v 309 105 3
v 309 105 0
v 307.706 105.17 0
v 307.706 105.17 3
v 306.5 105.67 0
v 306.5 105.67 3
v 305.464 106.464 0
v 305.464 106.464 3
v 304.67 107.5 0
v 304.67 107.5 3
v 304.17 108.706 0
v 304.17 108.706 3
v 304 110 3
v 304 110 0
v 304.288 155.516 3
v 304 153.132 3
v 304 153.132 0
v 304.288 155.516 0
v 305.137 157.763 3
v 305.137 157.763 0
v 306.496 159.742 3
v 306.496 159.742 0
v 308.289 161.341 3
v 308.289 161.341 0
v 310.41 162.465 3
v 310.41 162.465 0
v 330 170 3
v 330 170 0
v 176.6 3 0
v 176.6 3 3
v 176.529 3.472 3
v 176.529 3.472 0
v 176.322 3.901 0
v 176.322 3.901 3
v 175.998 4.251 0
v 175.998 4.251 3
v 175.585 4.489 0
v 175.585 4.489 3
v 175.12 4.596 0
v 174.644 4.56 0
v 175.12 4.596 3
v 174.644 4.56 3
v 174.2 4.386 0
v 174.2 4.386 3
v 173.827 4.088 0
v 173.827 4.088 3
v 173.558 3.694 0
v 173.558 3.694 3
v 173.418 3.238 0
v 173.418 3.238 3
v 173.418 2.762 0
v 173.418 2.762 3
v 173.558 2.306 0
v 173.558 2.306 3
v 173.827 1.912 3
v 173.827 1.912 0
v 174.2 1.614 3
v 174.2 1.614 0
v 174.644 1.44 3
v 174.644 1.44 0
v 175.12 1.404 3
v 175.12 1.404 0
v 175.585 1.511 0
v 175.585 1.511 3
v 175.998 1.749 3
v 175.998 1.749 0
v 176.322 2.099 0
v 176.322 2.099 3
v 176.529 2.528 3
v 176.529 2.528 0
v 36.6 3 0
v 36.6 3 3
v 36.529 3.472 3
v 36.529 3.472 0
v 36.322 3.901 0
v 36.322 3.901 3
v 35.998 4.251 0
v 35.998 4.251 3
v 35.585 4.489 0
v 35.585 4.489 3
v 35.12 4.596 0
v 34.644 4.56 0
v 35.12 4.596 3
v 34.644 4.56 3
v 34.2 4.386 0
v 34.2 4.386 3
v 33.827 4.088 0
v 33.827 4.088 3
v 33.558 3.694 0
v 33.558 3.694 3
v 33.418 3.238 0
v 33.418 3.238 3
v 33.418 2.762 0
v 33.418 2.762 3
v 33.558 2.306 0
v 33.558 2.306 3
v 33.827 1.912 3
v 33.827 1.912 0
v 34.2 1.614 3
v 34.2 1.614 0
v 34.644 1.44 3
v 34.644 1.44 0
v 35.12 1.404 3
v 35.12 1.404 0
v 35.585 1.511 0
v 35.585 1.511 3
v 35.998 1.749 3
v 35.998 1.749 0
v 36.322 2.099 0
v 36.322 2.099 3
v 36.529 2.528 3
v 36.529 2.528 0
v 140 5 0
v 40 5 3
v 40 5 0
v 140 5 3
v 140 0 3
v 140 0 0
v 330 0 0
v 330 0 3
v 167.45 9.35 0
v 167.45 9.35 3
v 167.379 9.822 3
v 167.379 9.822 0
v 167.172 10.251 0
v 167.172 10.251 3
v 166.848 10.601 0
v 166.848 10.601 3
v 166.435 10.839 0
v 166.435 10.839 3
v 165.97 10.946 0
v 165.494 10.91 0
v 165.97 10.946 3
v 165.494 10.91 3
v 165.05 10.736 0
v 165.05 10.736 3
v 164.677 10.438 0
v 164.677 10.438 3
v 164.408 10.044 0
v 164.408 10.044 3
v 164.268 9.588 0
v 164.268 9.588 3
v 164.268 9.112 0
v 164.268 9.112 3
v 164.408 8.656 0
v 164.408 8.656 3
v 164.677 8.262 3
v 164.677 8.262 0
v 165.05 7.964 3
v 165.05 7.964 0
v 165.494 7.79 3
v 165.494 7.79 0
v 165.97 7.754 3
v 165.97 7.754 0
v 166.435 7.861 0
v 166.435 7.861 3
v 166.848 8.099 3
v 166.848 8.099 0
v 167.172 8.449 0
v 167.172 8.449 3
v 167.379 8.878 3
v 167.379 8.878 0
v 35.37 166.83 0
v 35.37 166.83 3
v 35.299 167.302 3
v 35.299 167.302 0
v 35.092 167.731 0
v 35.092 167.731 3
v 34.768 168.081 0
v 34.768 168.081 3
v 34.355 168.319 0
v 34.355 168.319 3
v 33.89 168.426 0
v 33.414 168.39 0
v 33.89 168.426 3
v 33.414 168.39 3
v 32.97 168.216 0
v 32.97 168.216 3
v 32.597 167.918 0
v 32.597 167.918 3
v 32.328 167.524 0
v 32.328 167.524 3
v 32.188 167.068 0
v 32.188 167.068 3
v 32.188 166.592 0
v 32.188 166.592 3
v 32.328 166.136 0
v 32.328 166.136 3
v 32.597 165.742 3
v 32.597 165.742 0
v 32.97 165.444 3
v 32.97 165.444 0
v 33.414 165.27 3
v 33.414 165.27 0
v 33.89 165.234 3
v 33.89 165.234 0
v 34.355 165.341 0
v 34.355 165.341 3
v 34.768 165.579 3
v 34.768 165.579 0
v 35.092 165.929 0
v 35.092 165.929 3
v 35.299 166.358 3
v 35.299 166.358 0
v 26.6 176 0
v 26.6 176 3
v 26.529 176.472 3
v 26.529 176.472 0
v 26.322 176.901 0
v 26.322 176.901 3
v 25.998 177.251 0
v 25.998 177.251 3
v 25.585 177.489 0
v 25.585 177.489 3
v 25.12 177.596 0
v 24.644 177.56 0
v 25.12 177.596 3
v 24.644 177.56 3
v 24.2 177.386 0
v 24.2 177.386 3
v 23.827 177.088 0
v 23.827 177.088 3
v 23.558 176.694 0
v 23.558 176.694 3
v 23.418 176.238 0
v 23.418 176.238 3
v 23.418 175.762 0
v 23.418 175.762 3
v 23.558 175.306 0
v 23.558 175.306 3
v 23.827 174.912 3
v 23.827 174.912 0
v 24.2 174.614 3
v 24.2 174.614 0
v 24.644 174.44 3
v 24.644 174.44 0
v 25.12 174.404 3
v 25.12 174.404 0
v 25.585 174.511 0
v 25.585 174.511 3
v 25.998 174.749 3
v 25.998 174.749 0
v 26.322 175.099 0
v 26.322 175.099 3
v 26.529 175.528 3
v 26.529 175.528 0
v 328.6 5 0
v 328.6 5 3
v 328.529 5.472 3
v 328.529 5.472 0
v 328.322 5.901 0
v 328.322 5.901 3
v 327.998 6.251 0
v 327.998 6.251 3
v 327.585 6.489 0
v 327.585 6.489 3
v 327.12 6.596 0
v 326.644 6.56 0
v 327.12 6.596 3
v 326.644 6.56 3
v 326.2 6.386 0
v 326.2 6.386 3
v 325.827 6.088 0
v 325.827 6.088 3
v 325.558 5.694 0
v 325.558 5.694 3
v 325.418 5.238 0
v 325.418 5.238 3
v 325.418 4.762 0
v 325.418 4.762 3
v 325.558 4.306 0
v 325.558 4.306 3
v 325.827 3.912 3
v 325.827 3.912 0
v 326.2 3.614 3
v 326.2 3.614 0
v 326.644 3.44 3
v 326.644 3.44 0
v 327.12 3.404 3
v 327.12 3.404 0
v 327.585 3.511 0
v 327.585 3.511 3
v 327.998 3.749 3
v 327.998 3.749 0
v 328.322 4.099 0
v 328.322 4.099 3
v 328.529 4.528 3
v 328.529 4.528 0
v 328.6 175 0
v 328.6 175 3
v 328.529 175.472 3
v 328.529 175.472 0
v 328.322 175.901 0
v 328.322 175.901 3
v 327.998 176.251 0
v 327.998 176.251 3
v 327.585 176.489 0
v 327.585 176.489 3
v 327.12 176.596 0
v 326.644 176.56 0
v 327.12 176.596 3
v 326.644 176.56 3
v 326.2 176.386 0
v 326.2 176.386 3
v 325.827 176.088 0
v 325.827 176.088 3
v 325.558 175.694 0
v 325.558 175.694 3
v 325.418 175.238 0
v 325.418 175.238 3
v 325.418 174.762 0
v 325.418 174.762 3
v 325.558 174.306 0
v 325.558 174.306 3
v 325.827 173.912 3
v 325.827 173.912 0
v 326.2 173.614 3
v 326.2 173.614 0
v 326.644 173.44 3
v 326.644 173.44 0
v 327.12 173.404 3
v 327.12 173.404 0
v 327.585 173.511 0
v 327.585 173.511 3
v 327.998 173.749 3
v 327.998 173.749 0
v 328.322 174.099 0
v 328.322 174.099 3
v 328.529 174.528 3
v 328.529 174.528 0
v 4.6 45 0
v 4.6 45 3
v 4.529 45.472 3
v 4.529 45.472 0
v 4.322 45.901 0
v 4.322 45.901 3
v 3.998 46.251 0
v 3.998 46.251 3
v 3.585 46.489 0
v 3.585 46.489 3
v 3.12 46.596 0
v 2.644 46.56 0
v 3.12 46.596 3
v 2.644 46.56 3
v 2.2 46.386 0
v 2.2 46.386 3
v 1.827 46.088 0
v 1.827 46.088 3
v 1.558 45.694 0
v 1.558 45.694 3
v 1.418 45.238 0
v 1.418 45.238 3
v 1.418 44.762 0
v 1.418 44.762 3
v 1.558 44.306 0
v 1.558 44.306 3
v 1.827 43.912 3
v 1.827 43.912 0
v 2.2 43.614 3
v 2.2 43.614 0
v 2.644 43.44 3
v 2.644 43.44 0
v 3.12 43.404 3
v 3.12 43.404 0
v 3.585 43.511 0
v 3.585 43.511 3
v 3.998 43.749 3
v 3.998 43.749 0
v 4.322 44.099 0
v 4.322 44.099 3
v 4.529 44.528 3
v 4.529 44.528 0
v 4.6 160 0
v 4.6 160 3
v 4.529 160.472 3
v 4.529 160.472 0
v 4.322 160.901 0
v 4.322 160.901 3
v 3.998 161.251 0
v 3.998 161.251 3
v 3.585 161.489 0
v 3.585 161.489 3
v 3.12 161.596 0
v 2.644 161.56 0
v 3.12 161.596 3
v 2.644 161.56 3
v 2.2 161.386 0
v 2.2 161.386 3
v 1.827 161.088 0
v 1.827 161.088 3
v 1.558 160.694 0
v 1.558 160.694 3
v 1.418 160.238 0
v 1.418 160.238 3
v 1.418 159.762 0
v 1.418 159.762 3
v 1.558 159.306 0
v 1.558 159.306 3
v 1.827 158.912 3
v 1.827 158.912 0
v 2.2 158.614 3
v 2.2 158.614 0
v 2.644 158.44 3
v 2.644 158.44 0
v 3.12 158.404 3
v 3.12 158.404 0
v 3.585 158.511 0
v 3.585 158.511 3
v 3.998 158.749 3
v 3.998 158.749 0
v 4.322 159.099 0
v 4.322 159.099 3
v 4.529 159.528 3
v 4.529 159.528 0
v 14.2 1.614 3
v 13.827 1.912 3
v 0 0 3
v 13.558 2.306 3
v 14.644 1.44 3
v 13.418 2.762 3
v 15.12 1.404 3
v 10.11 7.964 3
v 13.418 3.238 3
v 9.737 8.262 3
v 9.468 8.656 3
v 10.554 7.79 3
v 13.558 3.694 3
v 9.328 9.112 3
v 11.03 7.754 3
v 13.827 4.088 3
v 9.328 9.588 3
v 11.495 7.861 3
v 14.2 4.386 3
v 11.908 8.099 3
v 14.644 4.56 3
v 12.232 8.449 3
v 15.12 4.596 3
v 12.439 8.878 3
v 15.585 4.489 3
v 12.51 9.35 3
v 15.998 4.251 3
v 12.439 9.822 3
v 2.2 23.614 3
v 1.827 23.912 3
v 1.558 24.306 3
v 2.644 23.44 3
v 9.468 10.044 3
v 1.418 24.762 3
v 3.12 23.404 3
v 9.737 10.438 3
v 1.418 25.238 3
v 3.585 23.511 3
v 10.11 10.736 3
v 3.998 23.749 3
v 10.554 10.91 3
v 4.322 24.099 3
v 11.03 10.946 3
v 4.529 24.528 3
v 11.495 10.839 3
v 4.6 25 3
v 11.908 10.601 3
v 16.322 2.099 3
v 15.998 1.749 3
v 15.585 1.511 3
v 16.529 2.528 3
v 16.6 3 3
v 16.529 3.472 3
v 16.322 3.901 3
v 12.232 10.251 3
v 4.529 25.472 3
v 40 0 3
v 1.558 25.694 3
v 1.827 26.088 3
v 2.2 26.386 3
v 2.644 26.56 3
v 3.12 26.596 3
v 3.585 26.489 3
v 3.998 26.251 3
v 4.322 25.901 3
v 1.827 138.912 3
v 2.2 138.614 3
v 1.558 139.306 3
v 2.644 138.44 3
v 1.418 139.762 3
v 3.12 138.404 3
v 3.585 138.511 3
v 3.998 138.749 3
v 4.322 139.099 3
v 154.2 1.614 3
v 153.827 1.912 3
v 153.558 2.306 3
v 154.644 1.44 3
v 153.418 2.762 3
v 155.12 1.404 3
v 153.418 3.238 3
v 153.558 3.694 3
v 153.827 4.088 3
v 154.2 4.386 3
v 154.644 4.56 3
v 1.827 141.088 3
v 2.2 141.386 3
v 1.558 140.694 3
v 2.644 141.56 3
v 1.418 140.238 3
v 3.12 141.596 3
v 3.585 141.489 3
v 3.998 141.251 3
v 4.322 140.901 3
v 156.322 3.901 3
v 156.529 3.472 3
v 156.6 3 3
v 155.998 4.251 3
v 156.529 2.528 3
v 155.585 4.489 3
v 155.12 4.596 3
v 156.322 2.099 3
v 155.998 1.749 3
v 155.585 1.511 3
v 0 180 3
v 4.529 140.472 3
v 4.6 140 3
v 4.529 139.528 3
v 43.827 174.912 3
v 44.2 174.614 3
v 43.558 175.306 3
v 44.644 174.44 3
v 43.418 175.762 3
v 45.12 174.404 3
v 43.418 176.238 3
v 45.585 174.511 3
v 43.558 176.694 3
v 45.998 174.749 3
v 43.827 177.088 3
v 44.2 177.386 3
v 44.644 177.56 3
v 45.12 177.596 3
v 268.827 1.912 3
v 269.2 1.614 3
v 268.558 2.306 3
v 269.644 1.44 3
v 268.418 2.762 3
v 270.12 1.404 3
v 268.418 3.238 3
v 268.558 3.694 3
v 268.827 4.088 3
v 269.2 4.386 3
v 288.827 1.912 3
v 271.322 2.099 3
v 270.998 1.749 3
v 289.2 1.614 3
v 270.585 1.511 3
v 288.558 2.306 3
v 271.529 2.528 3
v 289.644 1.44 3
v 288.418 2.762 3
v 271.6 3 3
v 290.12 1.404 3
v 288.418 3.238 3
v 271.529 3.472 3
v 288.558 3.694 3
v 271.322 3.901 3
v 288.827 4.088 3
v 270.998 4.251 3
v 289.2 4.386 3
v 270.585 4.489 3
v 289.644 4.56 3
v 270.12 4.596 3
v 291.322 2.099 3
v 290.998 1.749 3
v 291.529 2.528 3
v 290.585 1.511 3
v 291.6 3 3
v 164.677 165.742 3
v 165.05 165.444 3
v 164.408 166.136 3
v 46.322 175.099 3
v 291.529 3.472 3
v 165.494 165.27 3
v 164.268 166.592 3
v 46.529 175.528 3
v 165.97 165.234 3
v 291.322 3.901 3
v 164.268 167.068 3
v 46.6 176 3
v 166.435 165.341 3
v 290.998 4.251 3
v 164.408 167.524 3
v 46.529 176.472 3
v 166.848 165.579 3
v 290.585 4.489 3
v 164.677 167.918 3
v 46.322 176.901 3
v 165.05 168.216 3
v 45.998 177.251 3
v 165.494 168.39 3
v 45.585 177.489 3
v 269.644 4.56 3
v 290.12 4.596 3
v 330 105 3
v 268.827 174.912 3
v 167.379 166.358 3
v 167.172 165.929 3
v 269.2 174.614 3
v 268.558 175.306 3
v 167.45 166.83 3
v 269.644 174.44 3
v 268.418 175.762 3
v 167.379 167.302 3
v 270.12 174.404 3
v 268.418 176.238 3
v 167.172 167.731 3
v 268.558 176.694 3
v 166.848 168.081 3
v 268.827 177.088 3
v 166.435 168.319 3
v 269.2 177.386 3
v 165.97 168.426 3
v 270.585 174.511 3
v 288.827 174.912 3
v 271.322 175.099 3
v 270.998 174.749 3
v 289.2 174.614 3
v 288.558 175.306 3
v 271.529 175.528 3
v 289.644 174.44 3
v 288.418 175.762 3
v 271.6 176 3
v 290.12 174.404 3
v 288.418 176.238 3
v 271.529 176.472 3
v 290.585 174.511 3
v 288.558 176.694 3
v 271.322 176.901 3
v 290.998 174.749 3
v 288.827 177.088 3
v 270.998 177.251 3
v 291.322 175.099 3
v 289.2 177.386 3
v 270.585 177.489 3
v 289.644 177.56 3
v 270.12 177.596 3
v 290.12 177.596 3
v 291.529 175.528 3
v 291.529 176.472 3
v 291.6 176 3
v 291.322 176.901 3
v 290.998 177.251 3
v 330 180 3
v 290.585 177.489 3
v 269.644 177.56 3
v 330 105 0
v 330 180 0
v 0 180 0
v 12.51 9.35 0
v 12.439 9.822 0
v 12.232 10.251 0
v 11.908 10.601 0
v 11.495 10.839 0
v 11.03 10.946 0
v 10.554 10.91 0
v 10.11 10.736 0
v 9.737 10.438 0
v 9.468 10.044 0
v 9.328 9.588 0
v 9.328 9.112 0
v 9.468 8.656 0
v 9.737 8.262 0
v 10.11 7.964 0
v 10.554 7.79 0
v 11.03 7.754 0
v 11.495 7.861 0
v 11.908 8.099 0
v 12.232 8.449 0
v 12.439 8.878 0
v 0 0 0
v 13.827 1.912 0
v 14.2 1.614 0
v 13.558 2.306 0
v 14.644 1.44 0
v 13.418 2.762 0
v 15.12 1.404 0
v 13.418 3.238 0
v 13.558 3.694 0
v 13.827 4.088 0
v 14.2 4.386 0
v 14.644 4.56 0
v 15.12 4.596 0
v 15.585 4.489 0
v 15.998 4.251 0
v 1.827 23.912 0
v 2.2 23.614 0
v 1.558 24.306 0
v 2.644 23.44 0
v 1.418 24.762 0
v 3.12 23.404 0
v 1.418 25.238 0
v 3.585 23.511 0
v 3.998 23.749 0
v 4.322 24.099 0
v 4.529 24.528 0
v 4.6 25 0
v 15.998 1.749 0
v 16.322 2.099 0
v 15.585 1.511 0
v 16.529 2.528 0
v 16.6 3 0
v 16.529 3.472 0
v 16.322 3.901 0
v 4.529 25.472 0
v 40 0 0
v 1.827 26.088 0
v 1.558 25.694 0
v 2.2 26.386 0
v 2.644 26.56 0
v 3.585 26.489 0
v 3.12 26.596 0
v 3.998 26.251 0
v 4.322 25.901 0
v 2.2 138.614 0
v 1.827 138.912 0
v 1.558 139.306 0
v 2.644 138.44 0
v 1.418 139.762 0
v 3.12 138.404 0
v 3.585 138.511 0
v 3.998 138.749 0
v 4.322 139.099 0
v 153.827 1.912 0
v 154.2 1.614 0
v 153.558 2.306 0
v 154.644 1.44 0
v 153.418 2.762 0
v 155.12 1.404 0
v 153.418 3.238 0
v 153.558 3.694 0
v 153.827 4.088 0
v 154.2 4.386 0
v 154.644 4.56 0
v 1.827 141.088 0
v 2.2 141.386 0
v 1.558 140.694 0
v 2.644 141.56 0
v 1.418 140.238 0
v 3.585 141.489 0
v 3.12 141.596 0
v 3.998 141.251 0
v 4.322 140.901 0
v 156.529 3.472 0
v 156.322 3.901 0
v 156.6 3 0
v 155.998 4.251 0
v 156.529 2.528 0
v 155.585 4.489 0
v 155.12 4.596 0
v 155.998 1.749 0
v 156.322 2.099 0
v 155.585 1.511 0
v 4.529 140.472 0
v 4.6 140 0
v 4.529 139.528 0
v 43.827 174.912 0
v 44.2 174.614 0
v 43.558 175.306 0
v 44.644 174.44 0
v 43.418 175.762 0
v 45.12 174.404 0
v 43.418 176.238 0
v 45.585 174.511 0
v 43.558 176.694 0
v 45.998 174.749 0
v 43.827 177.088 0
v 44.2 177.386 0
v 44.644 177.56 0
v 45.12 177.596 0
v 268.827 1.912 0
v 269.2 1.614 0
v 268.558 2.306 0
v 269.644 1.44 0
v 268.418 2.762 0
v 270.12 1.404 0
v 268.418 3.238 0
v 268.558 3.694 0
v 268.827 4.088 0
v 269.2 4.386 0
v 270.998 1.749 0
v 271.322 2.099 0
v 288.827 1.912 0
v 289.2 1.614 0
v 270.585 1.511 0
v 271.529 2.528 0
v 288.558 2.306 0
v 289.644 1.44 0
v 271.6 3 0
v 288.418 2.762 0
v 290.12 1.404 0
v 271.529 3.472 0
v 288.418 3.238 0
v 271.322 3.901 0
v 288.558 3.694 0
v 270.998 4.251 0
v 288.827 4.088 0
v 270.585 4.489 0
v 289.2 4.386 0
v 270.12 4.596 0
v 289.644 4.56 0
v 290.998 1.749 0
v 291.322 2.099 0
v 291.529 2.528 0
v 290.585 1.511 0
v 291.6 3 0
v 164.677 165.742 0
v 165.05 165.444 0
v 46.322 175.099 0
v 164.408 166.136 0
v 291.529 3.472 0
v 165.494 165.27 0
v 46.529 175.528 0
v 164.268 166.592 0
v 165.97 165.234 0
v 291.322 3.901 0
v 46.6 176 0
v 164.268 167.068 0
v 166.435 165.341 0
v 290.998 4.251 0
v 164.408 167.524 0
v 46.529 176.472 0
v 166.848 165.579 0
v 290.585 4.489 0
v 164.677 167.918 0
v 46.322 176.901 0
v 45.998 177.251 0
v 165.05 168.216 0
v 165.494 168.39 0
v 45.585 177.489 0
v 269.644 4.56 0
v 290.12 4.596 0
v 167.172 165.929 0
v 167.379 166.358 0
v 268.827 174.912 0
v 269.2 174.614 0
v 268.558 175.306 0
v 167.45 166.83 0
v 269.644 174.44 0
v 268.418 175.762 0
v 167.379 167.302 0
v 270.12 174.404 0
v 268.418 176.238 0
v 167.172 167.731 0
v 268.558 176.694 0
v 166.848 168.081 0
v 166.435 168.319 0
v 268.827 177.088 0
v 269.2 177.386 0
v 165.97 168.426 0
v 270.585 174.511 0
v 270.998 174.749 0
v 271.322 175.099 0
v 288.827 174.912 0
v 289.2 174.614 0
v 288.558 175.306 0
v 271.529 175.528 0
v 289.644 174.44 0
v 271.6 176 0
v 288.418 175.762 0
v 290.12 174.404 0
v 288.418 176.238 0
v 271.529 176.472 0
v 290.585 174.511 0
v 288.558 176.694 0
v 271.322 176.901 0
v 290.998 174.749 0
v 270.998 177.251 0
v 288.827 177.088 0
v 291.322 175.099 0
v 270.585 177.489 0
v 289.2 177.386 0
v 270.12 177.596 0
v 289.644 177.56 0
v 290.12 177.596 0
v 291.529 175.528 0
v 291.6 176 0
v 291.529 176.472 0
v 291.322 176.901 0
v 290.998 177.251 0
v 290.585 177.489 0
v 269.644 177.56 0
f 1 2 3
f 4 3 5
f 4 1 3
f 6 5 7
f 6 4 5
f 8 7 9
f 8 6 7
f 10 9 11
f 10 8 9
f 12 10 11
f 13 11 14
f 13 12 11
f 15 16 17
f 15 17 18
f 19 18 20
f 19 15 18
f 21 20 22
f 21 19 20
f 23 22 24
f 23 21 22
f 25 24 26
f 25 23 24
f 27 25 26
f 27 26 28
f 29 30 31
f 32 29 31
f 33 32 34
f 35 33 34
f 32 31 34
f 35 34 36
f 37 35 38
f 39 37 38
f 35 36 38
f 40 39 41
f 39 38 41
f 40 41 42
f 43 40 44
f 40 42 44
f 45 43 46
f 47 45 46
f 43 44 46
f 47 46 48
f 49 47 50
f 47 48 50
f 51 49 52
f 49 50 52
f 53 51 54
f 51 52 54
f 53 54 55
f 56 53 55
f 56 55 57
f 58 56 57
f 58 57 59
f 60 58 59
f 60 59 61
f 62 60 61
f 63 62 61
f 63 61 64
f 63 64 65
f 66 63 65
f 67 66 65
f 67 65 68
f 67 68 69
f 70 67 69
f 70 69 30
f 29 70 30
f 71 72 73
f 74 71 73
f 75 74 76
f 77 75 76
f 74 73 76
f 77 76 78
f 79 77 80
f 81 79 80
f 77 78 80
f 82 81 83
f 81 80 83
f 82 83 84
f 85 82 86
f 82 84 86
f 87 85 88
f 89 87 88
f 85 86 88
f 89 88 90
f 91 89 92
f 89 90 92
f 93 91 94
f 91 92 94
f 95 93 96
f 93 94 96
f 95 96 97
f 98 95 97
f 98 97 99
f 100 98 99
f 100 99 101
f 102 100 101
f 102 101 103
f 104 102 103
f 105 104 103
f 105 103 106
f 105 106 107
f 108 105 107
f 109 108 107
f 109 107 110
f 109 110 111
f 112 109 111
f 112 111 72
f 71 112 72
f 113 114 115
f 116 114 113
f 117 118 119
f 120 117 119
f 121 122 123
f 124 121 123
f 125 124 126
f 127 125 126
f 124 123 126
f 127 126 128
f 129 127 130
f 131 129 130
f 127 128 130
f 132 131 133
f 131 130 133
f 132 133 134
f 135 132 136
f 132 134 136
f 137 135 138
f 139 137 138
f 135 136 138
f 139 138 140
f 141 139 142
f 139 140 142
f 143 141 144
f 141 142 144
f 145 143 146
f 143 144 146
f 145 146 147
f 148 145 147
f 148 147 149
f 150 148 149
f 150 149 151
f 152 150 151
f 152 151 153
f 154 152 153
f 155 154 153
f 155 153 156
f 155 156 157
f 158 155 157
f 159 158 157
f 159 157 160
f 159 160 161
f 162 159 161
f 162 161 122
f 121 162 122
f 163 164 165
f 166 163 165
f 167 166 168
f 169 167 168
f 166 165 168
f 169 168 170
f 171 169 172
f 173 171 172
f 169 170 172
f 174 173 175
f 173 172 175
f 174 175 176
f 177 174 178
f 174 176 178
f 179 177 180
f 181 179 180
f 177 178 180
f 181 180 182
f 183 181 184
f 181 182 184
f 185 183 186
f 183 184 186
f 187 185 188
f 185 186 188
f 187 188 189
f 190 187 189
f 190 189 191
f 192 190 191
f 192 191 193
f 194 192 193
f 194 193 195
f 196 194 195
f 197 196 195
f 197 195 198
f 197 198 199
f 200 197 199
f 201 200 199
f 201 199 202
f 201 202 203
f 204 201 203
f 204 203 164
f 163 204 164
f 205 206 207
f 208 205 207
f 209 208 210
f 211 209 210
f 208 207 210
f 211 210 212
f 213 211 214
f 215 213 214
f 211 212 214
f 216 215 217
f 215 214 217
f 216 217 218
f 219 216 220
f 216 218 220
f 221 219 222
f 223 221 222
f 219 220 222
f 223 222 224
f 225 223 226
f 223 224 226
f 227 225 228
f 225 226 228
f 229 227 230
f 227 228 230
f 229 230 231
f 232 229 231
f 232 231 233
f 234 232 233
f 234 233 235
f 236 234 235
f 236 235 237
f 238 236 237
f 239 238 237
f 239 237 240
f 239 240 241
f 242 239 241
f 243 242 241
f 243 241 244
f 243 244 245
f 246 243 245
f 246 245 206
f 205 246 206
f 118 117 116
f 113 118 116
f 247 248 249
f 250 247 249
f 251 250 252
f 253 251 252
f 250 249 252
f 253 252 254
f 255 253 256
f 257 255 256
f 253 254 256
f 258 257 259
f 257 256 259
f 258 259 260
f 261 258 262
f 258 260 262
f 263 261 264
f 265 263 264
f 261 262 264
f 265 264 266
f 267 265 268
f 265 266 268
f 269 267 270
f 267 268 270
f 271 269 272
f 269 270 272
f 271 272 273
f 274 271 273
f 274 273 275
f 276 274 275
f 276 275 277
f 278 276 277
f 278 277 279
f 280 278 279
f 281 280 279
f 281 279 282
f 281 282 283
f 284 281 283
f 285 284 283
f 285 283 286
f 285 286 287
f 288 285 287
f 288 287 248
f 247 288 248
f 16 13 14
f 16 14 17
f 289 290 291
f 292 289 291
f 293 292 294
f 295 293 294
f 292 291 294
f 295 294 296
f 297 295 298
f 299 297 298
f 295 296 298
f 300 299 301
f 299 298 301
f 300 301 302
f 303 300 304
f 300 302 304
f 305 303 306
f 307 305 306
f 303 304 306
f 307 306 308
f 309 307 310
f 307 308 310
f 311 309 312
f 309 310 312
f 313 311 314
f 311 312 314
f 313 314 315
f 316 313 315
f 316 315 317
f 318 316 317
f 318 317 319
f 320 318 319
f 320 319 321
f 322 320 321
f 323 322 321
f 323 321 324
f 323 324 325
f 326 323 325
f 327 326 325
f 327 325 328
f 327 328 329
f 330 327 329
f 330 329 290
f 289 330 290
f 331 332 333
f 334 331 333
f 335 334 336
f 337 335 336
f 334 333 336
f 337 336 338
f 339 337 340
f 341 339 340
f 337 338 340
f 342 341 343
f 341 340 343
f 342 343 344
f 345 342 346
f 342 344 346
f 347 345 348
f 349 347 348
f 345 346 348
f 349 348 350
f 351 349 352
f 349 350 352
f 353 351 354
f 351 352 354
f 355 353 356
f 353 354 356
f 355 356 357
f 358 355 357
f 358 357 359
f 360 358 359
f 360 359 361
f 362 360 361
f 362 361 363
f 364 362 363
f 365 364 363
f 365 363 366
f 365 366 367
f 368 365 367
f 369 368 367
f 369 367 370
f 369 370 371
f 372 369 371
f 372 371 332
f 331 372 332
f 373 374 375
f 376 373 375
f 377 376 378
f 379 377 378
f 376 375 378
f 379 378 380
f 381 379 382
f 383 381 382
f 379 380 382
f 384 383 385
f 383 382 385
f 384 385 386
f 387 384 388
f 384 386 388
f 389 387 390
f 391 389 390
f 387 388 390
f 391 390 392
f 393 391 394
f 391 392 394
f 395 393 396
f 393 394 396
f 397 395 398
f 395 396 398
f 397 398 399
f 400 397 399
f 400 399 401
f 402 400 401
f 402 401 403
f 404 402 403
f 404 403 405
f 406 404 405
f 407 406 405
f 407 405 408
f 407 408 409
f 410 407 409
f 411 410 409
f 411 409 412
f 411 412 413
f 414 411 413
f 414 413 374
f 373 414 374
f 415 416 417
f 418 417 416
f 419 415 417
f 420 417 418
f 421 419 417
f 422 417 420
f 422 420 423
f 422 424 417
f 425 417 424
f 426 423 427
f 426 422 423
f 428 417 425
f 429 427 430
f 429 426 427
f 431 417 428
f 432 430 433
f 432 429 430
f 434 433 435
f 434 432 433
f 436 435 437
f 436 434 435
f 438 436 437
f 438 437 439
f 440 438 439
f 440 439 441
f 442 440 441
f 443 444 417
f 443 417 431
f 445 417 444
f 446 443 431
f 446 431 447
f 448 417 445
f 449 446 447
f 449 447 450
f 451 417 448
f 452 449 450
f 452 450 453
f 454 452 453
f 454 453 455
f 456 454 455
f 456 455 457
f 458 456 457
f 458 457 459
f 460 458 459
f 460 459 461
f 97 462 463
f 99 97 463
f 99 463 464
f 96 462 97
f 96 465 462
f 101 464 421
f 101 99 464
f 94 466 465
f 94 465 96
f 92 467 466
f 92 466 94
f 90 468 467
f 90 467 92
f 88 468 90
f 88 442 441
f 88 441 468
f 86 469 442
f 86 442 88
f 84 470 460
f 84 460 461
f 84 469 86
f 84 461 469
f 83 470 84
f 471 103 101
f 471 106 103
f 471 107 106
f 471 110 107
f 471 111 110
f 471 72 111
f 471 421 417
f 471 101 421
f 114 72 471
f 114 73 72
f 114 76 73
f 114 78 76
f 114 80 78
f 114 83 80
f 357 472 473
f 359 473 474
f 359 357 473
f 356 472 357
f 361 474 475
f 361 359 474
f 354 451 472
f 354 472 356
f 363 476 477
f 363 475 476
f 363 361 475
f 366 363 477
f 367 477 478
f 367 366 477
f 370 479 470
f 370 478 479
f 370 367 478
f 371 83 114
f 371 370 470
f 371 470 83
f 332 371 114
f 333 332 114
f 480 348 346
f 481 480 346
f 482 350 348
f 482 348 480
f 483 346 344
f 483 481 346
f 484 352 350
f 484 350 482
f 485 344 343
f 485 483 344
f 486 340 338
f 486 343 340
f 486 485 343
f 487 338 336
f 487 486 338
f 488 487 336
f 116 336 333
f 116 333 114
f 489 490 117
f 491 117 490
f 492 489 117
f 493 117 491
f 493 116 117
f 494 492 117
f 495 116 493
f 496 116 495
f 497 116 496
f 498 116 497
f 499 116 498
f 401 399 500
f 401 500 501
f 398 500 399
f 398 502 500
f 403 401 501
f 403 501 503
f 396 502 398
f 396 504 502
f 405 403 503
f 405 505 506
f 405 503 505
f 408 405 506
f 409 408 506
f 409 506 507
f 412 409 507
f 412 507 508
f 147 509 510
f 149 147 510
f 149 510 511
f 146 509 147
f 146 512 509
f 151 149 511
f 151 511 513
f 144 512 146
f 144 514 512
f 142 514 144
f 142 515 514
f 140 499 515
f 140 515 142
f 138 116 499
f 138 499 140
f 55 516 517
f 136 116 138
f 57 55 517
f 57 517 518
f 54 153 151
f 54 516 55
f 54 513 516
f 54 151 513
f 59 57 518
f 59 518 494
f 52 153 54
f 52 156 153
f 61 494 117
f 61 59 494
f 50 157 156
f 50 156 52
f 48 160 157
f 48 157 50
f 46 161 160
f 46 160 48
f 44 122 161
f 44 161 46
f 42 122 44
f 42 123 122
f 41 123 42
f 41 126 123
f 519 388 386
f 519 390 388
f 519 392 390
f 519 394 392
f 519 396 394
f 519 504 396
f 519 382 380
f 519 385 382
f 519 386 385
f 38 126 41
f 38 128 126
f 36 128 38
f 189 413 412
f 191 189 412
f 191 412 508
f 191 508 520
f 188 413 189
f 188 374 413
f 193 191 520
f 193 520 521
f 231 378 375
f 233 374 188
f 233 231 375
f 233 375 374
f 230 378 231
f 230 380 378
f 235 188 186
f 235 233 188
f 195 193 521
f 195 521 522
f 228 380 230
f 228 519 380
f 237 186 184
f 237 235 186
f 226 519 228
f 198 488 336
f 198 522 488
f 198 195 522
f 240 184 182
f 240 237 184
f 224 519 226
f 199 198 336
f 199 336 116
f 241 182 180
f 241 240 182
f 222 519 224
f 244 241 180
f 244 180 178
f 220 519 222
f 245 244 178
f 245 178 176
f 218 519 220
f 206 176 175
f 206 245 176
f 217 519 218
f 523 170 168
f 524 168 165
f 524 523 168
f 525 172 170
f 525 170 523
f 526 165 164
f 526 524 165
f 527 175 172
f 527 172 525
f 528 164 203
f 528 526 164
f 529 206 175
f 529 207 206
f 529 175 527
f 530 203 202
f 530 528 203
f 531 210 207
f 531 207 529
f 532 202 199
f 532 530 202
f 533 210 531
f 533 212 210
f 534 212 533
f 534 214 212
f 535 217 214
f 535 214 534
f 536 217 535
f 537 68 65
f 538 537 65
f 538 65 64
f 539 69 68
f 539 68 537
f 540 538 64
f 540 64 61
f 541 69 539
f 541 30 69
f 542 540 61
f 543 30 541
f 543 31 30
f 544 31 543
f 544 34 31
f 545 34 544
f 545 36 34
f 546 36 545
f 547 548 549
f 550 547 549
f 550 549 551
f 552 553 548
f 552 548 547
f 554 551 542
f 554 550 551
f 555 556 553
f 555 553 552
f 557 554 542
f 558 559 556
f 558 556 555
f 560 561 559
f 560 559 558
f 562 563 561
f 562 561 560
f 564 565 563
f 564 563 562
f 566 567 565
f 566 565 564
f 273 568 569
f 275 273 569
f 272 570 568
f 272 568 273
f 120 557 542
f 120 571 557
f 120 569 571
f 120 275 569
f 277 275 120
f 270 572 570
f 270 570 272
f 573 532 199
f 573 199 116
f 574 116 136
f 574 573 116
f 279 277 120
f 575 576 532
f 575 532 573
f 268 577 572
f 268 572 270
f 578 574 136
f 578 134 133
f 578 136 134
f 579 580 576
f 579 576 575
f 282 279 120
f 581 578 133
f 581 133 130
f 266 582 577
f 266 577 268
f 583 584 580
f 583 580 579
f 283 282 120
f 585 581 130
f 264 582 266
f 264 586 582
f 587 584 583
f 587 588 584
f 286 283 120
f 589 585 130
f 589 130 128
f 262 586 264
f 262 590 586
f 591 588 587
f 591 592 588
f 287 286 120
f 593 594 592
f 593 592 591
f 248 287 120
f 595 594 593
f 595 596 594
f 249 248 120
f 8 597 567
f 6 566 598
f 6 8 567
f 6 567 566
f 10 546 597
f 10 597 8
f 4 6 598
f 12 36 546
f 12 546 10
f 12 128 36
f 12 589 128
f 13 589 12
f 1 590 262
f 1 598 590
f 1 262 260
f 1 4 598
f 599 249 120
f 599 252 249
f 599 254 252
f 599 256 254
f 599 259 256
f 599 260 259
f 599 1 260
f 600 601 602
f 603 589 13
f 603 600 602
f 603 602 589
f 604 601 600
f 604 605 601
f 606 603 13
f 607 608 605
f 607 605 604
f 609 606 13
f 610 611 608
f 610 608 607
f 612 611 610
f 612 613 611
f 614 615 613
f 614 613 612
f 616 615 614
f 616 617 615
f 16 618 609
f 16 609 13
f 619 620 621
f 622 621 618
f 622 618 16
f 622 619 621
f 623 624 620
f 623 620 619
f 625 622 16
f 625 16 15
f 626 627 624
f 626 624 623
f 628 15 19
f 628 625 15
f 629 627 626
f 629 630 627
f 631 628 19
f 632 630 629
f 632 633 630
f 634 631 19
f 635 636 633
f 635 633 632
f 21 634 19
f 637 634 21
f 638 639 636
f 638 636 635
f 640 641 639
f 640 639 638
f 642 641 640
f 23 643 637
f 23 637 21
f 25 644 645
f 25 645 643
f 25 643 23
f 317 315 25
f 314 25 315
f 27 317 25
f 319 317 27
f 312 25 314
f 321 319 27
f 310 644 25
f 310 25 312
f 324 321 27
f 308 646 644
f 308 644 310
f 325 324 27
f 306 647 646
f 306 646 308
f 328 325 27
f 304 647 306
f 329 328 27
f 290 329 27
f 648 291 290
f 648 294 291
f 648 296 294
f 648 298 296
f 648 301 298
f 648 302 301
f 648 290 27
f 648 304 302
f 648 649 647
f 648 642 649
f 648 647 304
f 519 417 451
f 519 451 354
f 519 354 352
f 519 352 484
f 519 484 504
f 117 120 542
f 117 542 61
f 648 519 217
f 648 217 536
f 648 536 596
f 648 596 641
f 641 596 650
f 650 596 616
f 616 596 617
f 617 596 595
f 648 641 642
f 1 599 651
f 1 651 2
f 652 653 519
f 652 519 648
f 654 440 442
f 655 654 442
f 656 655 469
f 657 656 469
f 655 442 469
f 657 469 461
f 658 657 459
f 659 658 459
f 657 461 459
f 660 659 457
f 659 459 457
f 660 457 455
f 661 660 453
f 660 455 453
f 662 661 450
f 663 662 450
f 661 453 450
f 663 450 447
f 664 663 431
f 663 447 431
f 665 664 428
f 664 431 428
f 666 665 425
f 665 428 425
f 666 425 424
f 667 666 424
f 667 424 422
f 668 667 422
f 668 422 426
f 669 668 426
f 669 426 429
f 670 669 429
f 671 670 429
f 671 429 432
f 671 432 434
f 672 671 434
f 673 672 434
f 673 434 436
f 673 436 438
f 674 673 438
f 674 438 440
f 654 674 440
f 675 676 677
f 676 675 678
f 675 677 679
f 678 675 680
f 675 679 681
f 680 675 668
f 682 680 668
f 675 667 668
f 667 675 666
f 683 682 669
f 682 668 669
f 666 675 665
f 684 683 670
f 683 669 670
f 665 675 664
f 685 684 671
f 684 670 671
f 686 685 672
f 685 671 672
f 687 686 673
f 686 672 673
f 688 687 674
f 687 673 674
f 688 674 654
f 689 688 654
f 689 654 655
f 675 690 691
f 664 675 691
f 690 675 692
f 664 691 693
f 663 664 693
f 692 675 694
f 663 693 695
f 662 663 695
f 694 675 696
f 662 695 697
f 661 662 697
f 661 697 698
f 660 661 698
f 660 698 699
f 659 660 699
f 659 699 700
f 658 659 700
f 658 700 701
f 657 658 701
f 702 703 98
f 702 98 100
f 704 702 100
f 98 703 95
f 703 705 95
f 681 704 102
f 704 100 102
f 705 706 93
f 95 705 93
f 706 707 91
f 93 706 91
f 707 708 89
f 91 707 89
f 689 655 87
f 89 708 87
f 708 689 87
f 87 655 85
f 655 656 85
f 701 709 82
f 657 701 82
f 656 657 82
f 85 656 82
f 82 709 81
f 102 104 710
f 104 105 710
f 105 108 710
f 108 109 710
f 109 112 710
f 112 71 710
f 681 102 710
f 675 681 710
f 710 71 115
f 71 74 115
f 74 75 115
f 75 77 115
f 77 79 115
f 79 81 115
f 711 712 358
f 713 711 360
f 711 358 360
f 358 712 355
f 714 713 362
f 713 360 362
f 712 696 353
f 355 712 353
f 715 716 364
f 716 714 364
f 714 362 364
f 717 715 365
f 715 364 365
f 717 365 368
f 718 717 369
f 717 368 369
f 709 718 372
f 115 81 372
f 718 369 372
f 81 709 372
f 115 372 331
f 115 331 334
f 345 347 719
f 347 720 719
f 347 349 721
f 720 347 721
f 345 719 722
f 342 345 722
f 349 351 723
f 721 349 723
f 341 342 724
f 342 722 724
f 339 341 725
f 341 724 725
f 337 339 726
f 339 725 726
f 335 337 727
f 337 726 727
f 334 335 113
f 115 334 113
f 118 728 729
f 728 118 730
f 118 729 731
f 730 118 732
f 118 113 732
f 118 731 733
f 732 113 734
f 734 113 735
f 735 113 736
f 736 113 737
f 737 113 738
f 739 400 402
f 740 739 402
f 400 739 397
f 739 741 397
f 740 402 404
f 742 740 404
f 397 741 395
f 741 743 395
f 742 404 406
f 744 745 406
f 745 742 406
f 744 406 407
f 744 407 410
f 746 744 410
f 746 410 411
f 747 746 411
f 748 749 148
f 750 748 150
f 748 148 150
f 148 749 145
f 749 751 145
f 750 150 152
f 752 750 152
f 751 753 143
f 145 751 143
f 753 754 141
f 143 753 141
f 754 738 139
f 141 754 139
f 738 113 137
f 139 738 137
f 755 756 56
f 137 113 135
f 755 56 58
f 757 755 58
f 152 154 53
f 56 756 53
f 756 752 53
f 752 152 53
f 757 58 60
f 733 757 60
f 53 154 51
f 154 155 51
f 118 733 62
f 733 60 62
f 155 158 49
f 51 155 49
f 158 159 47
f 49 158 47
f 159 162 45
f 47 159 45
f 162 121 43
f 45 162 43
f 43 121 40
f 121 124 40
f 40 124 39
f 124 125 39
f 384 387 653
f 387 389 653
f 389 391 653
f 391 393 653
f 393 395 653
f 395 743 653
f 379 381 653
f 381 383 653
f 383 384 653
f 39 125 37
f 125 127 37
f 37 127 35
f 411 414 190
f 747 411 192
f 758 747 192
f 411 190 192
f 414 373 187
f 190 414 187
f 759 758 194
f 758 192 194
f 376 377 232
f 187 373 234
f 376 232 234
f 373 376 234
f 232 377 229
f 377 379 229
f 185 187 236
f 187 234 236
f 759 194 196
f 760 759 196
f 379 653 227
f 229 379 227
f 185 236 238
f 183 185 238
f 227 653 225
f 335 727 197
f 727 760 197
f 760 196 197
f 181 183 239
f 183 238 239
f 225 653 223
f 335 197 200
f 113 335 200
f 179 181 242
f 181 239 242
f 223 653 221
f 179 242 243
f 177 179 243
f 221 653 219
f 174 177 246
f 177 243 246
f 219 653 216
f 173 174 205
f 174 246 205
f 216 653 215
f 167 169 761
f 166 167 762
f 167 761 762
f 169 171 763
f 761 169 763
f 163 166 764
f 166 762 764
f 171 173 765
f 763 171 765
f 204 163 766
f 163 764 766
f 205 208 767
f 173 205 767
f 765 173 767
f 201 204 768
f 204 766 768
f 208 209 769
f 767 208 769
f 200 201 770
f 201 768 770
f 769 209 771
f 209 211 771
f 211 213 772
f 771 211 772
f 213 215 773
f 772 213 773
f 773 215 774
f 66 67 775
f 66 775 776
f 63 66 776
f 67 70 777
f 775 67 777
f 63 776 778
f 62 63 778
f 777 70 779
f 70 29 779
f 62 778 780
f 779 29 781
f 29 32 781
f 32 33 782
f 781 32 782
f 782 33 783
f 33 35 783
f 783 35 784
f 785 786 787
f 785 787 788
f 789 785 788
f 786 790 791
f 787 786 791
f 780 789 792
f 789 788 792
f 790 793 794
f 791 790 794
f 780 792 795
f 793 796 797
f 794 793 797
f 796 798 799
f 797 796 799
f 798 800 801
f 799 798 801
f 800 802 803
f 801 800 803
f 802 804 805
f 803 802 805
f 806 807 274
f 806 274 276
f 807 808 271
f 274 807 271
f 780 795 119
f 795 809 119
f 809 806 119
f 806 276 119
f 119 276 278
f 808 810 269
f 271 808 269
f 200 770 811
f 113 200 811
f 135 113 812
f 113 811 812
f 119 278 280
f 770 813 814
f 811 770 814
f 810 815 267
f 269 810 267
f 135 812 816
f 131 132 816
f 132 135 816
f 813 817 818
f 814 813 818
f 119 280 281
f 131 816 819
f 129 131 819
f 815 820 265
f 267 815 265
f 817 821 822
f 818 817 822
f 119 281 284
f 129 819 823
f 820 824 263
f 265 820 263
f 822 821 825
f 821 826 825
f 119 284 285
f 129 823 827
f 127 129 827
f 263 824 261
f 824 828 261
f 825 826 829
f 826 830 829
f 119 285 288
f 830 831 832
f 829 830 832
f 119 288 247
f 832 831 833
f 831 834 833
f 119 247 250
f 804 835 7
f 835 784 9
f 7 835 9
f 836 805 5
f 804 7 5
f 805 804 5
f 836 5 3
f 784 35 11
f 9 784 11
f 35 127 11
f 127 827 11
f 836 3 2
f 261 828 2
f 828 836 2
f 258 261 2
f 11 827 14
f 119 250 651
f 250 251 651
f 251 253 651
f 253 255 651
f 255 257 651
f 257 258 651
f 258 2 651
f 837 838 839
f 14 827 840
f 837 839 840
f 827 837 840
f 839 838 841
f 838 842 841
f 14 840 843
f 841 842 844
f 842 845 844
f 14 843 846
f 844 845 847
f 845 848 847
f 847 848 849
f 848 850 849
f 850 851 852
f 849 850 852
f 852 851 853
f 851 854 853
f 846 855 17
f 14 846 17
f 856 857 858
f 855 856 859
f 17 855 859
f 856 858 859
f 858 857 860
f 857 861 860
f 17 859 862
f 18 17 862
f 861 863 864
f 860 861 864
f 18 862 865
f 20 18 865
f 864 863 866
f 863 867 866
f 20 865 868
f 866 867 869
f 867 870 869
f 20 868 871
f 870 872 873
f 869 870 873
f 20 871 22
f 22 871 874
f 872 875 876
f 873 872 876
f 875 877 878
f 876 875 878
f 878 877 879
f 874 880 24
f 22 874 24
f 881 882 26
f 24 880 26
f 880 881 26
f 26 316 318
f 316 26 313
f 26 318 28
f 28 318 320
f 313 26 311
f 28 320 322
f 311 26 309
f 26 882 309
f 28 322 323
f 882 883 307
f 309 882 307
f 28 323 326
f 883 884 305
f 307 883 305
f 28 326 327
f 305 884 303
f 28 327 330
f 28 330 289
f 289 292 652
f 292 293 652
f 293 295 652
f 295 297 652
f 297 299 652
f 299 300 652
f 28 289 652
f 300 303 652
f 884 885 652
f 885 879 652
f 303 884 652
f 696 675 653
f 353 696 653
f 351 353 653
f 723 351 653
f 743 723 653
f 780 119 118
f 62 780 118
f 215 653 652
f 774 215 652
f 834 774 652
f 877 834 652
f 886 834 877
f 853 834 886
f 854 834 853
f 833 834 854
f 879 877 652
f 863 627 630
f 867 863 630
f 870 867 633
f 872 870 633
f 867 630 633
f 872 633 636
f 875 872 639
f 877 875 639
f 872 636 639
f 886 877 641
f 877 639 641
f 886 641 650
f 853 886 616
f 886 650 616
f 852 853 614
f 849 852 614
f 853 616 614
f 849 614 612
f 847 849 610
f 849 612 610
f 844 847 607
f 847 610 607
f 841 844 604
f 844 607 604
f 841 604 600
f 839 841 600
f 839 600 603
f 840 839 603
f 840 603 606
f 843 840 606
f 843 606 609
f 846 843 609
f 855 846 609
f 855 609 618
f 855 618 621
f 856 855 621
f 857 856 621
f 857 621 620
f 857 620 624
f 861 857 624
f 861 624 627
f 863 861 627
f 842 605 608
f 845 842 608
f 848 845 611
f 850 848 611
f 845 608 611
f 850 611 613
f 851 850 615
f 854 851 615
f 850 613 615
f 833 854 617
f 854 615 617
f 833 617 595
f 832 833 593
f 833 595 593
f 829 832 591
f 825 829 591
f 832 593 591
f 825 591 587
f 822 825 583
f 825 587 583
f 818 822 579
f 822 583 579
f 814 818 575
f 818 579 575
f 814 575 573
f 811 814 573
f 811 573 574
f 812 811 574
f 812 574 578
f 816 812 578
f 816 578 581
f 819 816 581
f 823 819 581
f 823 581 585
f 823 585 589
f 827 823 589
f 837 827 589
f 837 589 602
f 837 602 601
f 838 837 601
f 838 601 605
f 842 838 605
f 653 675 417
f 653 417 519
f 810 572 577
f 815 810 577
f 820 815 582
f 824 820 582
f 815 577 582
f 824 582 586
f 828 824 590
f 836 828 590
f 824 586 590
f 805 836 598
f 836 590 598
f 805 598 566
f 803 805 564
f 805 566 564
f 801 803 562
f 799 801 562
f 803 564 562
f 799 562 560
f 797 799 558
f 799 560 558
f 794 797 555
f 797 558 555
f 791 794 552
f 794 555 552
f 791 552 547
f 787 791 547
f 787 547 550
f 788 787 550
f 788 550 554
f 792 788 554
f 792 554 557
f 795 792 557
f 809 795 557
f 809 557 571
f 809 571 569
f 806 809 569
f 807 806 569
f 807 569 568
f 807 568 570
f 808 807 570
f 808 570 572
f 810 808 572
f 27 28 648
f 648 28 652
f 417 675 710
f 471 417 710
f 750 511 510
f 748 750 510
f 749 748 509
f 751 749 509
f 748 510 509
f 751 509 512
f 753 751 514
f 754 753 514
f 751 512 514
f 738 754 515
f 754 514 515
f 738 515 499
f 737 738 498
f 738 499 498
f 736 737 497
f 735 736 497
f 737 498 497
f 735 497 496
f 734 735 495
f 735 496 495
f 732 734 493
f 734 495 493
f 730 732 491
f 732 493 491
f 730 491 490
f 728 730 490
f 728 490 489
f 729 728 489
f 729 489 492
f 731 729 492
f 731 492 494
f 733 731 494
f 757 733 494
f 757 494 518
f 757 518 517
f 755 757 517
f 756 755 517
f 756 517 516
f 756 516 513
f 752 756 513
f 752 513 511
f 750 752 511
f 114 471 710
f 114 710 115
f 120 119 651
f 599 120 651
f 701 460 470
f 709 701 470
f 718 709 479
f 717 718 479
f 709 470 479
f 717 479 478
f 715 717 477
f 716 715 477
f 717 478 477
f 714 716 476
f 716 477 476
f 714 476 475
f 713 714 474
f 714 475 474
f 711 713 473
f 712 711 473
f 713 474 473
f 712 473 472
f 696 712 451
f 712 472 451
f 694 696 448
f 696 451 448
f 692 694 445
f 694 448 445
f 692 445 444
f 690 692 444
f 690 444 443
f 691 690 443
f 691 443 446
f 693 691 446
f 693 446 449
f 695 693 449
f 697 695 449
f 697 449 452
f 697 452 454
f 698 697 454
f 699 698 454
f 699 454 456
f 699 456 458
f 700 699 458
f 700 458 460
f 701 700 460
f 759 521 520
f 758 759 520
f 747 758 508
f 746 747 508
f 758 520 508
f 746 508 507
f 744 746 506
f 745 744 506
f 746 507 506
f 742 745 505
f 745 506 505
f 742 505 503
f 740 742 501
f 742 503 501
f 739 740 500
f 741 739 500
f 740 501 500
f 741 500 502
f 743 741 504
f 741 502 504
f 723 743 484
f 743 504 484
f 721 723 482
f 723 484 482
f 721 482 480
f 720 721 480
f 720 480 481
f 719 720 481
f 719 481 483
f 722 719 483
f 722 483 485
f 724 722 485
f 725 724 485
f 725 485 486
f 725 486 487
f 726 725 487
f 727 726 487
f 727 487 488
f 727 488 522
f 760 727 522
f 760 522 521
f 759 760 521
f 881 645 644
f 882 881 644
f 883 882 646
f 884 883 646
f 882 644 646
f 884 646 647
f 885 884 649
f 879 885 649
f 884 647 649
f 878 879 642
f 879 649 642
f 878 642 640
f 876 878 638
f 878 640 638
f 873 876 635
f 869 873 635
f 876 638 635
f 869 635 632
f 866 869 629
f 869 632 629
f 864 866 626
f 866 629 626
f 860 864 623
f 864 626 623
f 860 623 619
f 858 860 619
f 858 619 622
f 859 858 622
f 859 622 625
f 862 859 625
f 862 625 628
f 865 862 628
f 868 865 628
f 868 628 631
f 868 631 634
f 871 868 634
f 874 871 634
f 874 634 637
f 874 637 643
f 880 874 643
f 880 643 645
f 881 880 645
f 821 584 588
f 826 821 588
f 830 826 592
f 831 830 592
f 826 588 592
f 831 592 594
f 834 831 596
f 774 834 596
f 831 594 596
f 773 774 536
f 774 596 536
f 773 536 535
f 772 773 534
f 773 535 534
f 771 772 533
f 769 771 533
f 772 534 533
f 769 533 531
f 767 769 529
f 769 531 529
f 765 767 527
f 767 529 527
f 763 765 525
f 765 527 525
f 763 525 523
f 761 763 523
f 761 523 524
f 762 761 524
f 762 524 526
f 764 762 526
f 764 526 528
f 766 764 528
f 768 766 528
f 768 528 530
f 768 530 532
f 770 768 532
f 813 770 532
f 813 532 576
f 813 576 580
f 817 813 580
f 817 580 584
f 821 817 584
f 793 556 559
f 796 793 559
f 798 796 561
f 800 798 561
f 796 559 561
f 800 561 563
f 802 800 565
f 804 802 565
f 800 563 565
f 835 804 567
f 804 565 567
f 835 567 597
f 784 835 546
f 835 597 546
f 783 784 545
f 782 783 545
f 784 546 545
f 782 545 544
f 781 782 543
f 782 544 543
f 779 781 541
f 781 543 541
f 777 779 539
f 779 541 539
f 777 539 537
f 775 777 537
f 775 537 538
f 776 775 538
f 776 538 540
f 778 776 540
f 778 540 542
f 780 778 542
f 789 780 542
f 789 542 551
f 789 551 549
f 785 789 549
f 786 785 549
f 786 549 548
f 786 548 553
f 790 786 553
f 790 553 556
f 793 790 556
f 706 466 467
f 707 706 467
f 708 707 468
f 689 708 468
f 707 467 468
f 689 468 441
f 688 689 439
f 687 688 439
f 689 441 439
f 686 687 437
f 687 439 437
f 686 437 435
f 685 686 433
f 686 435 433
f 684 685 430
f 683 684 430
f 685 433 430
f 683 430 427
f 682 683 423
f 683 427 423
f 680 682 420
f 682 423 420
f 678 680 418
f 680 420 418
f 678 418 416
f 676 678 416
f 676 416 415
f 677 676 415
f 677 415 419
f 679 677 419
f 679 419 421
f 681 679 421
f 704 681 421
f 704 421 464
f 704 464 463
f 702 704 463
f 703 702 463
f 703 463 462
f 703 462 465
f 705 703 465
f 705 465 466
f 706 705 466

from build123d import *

# Parameters (mm, degrees)
SKETCH_1_W          = 330
SKETCH_1_H          = 180
EXTRUDE_1_DEPTH     = 3
SKETCH_2_R          = 1.6
CUT_EXTRUDE_1_DEPTH = 376.910893697
SKETCH_3_R          = 1.6
CUT_EXTRUDE_2_DEPTH = 376.910893697
CUT_EXTRUDE_3_REACH = 377.911
SKETCH_4_W          = 100
SKETCH_4_H          = 5
CUT_EXTRUDE_4_REACH = 377.911


with BuildPart() as part:
    # 草图1 → 凸台-拉伸1 (new body)
    with BuildSketch(Plane.XY):
        with Locations((165, 90)):
            Rectangle(SKETCH_1_W, SKETCH_1_H)
    extrude(amount=EXTRUDE_1_DEPTH)

    # 草图2 → 切除-拉伸1 (cut, through all)
    with BuildSketch(Plane.XY.offset(3)):
        with Locations((33.77, 166.83)):
            Circle(SKETCH_2_R)
        with Locations((165.85, 166.83)):
            Circle(SKETCH_2_R)
        with Locations((10.91, 9.35)):
            Circle(SKETCH_2_R)
        with Locations((165.85, 9.35)):
            Circle(SKETCH_2_R)
    extrude(amount=-CUT_EXTRUDE_1_DEPTH, mode=Mode.SUBTRACT)

    # 草图3 → 切除-拉伸2 (cut, through all)
    with BuildSketch(Plane.XY.offset(3)):
        with Locations((3, 160)):
            Circle(SKETCH_3_R)
        with Locations((3, 140)):
            Circle(SKETCH_3_R)
        with Locations((3, 45)):
            Circle(SKETCH_3_R)
        with Locations((3, 25)):
            Circle(SKETCH_3_R)
        with Locations((15, 3)):
            Circle(SKETCH_3_R)
        with Locations((35, 3)):
            Circle(SKETCH_3_R)
        with Locations((155, 3)):
            Circle(SKETCH_3_R)
        with Locations((175, 3)):
            Circle(SKETCH_3_R)
        with Locations((25, 176)):
            Circle(SKETCH_3_R)
        with Locations((45, 176)):
            Circle(SKETCH_3_R)
        with Locations((270, 176)):
            Circle(SKETCH_3_R)
        with Locations((290, 176)):
            Circle(SKETCH_3_R)
        with Locations((270, 3)):
            Circle(SKETCH_3_R)
        with Locations((290, 3)):
            Circle(SKETCH_3_R)
        with Locations((327, 5)):
            Circle(SKETCH_3_R)
        with Locations((327, 175)):
            Circle(SKETCH_3_R)
    extrude(amount=-CUT_EXTRUDE_2_DEPTH, mode=Mode.SUBTRACT)

    # 草图4 → 切除-拉伸3 (cut, up to next)
    with BuildSketch(Plane.XY.offset(3), mode=Mode.PRIVATE) as cut_extrude_3_sk1:
        with Locations((90, 2.5)):
            Rectangle(SKETCH_4_W, SKETCH_4_H)
    cut_extrude_3_tool1 = extrude(cut_extrude_3_sk1.sketch, amount=-CUT_EXTRUDE_3_REACH, mode=Mode.PRIVATE) & part.part
    add(cut_extrude_3_tool1.solids().sort_by_distance((90, 2.5, 3))[0], mode=Mode.SUBTRACT)

    # 草图6 → 切除-拉伸4 (cut, up to next)
    with BuildSketch(Plane.XY.offset(3), mode=Mode.PRIVATE) as cut_extrude_4_sk1:
        with BuildLine():
            Line((330, 170), (330, 105))
            Line((330, 105), (309, 105))
            ThreePointArc((309, 105), (305.464466094, 106.464466094), (304, 110))
            Line((304, 110), (304, 153.132009018))
            ThreePointArc((304, 153.132009018), (305.75688445, 158.793373344), (310.410209207, 162.46546508))
            Line((310.410209207, 162.46546508), (330, 170))
        make_face()
    cut_extrude_4_tool1 = extrude(cut_extrude_4_sk1.sketch, amount=-CUT_EXTRUDE_4_REACH, mode=Mode.PRIVATE) & part.part
    add(cut_extrude_4_tool1.solids().sort_by_distance((317.469531, 135.038029, 3))[0], mode=Mode.SUBTRACT)


solid = part.part
